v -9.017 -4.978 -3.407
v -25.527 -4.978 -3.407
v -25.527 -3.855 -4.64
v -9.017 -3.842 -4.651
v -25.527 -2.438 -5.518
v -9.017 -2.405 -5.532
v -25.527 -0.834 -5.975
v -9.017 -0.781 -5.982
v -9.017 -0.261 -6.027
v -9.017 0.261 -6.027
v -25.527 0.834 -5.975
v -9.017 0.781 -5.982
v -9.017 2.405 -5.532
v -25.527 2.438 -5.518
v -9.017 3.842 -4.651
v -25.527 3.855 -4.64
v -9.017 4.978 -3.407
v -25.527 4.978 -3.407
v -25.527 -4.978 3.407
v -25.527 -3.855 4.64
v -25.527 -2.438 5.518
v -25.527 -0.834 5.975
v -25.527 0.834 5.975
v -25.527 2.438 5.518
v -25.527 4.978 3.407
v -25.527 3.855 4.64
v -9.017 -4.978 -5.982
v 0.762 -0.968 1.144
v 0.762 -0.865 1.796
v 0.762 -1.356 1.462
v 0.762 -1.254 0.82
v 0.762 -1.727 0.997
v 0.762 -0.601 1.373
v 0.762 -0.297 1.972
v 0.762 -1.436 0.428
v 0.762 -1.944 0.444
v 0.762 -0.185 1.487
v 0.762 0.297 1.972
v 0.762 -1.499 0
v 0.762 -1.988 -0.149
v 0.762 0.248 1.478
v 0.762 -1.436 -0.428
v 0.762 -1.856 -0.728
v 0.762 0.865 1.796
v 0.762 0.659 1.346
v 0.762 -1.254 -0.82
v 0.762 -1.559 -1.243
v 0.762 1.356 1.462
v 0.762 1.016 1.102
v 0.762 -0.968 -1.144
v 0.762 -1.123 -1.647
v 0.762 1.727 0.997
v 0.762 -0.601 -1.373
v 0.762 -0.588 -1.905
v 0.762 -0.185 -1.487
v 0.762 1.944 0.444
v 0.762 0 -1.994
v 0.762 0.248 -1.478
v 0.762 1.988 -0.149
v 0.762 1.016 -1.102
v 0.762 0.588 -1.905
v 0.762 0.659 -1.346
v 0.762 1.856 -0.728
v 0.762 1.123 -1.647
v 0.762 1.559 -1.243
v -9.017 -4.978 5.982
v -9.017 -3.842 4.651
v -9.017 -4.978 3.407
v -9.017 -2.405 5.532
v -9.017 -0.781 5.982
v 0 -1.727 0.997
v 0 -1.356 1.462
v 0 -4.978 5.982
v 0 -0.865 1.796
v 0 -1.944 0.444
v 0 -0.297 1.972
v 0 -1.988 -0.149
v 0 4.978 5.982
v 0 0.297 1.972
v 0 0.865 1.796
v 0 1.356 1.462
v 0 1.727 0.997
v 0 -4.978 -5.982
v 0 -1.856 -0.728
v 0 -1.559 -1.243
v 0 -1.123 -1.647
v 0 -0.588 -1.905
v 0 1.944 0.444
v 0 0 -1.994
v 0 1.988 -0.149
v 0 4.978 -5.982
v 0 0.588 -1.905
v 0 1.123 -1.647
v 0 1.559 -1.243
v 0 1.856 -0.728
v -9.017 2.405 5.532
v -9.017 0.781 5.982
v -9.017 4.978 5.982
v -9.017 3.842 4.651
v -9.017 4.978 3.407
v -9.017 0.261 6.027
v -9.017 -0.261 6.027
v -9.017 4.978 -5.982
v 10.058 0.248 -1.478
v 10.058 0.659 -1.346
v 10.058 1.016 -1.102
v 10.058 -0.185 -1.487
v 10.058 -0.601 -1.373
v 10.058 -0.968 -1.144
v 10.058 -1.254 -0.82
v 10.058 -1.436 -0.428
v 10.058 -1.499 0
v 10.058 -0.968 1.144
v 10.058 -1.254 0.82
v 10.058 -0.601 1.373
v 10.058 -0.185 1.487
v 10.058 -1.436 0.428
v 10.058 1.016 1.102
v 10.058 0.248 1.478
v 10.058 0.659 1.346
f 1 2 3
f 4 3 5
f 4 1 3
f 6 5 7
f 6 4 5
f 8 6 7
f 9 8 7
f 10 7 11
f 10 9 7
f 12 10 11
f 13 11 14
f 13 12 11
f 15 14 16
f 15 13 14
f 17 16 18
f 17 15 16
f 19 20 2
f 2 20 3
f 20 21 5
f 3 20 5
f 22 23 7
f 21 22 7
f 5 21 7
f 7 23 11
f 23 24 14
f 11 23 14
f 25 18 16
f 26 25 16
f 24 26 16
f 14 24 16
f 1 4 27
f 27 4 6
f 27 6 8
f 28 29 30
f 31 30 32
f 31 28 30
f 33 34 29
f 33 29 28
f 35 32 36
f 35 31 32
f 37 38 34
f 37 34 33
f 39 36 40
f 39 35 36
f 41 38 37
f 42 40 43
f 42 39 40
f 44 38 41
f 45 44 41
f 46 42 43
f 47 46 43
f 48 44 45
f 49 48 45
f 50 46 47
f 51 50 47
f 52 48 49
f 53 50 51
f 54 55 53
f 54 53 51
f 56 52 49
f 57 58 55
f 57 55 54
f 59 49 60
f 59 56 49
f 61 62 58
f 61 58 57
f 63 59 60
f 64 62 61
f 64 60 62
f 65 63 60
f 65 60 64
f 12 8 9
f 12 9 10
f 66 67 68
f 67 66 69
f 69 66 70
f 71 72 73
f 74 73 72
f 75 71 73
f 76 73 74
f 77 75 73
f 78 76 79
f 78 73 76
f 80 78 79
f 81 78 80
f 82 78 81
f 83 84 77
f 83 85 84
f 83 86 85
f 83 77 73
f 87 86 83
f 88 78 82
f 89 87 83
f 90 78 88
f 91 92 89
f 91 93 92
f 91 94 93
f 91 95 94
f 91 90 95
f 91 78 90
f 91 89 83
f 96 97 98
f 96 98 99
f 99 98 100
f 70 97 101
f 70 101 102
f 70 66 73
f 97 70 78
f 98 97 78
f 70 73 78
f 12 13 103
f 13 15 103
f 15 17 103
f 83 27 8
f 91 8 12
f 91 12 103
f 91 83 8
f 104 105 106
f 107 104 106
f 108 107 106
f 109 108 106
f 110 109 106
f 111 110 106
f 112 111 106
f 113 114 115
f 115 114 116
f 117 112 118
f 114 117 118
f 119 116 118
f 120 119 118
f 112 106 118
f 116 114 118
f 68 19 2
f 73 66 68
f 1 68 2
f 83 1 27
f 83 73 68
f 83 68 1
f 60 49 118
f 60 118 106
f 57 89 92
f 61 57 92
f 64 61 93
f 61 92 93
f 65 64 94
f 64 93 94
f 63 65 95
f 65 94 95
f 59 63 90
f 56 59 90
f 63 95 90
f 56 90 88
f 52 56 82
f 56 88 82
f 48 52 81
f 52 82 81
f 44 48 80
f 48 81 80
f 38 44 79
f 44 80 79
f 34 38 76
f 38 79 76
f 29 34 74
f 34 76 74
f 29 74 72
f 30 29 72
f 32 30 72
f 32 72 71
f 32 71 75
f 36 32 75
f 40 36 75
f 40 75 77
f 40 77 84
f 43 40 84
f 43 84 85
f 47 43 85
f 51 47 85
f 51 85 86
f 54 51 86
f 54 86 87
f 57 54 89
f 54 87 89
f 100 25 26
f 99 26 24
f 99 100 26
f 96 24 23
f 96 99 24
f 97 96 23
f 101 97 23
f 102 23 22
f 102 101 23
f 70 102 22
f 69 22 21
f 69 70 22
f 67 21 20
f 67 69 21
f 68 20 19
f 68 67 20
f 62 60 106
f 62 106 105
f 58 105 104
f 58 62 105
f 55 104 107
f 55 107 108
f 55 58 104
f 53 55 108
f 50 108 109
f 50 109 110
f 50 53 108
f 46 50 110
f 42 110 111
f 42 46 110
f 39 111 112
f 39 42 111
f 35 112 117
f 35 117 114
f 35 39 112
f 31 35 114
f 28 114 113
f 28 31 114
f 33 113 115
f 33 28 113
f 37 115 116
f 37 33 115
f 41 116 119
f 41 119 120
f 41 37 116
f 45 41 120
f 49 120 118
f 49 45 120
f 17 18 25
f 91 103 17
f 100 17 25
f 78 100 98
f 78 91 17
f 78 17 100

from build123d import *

# Parameters (mm, degrees)
SKETCH1_W           = 11.9634
SKETCH1_H           = 9.9568
BOSS_EXTRUDE1_DEPTH = 9.017
BOSS_EXTRUDE2_DEPTH = 10.0584
SKETCH3_R           = 1.9939
BOSS_EXTRUDE3_DEPTH = 0.762
BOSS_EXTRUDE4_DEPTH = 16.51


with BuildPart() as part:
    # Sketch1 → Boss-Extrude1 (new body)
    with BuildSketch(Plane(origin=(0, 0, 0), x_dir=(0, 0, -1), z_dir=(1, 0, 0))):
        Rectangle(SKETCH1_W, SKETCH1_H)
    extrude(amount=-BOSS_EXTRUDE1_DEPTH)

    # Sketch2 → Boss-Extrude2 (add)
    with BuildSketch(Plane(origin=(0, 0, 0), x_dir=(0, 0, -1), z_dir=(1, 0, 0))):
        with BuildLine():
            Line((-1.101610621, 1.016), (1.101610621, 1.016))
            ThreePointArc((1.101610621, 1.016), (0, -1.4986), (-1.101610621, 1.016))
        make_face()
    extrude(amount=BOSS_EXTRUDE2_DEPTH)

    # Sketch3 → Boss-Extrude3 (add)
    with BuildSketch(Plane(origin=(0, 0, 0), x_dir=(0, 0, -1), z_dir=(1, 0, 0))):
        Circle(SKETCH3_R)
    extrude(amount=BOSS_EXTRUDE3_DEPTH)

    # Sketch4 → Boss-Extrude4 (add)
    with BuildSketch(Plane.ZY.offset(9.017)):
        with BuildLine():
            Line((-3.406844536, 4.9784), (3.406844536, 4.9784))
            ThreePointArc((3.406844536, 4.9784), (6.0325, 0), (3.406844536, -4.9784))
            Line((3.406844536, -4.9784), (-3.406844536, -4.9784))
            ThreePointArc((-3.406844536, -4.9784), (-6.0325, 0), (-3.406844536, 4.9784))
        make_face()
    extrude(amount=BOSS_EXTRUDE4_DEPTH)


solid = part.part
